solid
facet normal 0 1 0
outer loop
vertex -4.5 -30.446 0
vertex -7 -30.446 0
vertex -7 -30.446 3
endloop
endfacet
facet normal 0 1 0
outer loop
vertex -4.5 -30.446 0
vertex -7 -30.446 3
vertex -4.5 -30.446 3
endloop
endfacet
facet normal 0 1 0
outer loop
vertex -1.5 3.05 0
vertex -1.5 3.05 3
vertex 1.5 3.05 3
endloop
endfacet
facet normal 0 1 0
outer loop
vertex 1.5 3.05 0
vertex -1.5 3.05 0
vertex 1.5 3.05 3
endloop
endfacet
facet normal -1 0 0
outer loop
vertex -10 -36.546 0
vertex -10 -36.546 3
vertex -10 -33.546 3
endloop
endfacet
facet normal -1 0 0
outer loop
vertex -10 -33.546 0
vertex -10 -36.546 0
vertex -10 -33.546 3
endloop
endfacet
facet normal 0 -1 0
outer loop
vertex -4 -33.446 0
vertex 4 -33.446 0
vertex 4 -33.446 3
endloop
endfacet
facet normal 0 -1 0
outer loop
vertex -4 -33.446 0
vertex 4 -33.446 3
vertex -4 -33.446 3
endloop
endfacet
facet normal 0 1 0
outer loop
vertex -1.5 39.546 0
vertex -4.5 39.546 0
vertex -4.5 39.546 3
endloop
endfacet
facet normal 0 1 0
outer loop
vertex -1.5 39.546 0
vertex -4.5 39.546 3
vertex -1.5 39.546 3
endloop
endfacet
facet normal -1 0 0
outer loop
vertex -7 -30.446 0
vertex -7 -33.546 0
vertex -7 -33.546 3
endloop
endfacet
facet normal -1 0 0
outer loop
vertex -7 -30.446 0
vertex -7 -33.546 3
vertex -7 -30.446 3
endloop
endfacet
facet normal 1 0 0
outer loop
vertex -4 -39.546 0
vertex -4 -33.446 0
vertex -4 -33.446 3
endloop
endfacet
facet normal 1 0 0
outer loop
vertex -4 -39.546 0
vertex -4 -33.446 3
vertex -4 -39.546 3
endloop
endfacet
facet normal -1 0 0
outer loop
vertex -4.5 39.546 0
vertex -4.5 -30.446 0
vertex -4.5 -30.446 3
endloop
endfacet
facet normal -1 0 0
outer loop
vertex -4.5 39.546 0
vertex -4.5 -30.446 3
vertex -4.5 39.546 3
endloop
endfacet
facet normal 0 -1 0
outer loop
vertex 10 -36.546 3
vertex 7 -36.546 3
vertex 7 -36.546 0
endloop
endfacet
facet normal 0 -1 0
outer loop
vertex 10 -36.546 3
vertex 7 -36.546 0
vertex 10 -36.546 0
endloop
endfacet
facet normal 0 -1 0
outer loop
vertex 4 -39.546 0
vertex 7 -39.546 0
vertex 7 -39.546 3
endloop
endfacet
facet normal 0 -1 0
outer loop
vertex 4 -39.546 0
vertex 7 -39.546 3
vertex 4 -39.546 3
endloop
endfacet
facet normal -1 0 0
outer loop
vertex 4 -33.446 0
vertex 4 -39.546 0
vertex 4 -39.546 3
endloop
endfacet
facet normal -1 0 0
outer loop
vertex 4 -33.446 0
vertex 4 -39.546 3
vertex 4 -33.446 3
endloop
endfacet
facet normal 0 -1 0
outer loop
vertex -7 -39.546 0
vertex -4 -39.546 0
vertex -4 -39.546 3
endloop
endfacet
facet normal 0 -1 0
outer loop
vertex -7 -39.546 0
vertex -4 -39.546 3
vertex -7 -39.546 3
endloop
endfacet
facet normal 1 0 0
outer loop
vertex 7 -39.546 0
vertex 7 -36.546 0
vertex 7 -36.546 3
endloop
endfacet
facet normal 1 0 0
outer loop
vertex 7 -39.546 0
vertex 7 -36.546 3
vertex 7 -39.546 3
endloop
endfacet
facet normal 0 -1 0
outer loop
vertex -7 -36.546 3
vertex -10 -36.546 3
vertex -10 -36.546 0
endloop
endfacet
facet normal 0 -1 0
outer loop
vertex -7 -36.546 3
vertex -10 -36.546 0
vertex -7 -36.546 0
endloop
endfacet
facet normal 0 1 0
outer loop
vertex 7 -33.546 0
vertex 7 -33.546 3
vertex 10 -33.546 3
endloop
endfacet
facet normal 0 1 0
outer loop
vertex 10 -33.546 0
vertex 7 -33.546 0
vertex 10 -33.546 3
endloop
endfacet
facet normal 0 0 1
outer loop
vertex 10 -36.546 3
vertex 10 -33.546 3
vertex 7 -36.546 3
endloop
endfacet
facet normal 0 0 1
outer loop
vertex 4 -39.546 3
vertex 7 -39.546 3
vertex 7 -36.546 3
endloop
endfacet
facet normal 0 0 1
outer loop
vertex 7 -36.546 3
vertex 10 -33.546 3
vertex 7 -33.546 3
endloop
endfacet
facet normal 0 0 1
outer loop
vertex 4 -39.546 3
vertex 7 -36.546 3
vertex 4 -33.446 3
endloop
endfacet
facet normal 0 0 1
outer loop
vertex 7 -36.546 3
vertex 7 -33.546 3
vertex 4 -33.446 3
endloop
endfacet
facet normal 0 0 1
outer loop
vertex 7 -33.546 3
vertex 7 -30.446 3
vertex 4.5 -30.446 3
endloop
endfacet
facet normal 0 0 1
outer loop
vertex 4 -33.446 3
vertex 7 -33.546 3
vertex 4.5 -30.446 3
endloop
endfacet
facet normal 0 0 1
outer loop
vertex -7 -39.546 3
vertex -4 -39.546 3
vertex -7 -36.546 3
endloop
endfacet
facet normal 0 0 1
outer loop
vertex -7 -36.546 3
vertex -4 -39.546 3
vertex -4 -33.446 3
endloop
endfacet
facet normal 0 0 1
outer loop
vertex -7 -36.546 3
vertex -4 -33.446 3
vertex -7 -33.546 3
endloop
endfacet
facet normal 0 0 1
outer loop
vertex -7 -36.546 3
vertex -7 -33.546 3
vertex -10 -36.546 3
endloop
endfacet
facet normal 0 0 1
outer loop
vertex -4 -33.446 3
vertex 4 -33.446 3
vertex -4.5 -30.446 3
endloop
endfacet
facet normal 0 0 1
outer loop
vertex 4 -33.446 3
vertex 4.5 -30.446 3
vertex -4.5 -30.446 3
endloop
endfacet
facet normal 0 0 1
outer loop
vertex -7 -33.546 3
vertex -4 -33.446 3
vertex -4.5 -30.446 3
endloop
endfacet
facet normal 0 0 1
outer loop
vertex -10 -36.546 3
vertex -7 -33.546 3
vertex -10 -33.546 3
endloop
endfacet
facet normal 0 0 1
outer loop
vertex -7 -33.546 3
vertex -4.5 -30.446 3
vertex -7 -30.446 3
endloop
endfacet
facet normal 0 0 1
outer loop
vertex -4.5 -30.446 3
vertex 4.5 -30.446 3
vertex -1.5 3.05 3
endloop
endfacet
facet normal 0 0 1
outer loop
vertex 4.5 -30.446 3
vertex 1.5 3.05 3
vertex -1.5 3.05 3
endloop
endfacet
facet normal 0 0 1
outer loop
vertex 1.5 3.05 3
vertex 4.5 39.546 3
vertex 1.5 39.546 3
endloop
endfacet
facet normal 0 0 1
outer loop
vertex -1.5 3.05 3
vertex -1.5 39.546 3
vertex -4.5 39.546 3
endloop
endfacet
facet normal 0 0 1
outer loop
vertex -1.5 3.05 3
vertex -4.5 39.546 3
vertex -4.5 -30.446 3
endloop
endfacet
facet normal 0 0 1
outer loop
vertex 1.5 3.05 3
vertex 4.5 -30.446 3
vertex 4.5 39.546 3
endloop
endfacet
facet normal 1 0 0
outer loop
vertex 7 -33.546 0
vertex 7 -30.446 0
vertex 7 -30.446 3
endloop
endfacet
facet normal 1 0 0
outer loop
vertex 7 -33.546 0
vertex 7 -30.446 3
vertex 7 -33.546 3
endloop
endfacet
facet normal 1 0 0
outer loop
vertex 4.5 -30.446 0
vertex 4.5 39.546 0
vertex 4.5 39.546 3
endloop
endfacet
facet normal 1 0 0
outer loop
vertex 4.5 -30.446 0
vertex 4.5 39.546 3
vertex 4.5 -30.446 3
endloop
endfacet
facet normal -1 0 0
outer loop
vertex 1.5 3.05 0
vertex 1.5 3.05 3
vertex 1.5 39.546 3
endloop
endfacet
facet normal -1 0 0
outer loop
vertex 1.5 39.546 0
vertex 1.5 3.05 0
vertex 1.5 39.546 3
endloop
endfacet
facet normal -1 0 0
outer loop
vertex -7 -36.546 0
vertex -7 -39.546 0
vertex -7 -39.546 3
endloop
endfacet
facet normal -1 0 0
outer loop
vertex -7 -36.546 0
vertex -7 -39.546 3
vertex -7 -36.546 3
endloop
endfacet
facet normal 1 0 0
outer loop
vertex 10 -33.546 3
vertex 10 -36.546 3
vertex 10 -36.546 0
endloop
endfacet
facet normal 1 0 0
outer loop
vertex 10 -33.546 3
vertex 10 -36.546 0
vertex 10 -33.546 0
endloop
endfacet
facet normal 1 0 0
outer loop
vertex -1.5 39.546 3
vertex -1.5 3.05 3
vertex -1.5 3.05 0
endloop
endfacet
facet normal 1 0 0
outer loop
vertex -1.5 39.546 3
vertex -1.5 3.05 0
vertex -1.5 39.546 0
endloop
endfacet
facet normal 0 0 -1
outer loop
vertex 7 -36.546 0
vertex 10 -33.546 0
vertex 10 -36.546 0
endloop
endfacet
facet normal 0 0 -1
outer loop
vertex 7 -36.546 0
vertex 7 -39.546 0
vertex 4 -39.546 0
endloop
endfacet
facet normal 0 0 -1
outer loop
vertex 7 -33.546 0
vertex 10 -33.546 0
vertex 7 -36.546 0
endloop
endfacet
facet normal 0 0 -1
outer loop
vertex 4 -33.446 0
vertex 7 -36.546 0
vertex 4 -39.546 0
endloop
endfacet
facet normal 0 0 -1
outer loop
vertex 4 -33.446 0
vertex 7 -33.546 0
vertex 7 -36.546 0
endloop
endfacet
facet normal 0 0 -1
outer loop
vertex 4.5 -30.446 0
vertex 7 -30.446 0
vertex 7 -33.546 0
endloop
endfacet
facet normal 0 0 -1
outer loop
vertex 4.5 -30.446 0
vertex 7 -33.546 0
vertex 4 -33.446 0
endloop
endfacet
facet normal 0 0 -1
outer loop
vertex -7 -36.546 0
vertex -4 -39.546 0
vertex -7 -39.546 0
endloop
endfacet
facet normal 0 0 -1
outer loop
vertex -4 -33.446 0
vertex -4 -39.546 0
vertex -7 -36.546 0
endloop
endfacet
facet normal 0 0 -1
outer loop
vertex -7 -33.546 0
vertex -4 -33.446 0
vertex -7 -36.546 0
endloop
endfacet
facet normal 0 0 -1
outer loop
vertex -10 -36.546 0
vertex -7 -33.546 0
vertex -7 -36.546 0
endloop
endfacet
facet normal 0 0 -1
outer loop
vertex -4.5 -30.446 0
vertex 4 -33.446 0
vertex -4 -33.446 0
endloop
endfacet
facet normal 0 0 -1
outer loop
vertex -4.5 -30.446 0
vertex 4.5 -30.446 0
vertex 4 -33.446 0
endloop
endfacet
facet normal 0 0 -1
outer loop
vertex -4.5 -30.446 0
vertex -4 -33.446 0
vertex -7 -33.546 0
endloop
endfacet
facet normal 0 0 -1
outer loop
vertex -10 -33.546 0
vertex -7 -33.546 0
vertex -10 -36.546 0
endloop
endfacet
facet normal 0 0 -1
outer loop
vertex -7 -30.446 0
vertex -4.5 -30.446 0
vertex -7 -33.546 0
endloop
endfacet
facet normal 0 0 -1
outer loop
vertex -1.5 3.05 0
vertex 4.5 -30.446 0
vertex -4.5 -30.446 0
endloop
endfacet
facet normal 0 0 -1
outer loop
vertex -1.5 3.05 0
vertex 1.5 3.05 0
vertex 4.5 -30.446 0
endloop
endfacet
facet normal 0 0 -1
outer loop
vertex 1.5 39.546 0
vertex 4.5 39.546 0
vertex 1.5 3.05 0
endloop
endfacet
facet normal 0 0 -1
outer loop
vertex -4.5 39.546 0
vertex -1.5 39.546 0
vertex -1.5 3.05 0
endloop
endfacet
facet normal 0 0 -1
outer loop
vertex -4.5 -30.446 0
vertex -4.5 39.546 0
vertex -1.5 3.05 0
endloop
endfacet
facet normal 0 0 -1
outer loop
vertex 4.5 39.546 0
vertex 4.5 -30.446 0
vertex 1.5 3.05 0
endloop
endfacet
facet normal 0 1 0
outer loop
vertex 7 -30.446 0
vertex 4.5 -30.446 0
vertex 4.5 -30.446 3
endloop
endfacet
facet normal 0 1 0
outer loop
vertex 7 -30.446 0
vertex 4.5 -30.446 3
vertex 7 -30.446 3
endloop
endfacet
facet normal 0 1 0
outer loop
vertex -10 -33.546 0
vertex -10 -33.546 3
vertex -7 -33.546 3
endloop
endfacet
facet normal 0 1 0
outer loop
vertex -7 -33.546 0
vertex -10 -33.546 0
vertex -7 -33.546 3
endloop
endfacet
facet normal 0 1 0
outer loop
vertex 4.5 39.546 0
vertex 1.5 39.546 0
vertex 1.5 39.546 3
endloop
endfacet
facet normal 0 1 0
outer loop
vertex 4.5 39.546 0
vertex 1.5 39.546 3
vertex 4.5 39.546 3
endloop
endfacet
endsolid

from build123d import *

# Parameters (mm, degrees)
EXTRUDE_1_DEPTH     = 3
SKETCH_2_W          = 3
SKETCH_2_H          = 36.495999937
CUT_EXTRUDE_1_DEPTH = 3
SKETCH_3_W          = 3
SKETCH_3_H          = 3
EXTRUDE_2_DEPTH     = 3


with BuildPart() as part:
    # 스케치1 → 보스-돌출1 (new body)
    with BuildSketch(Plane.XY):
        Polygon((-4.5, 39.545999937), (4.5, 39.545999937), (4.5, -30.445999937), (7, -30.445999937), (7, -39.545999937), (4, -39.545999937), (4, -33.445999937), (-4, -33.445999937), (-4, -39.545999937), (-7, -39.545999937), (-7, -30.445999937), (-4.5, -30.445999937), align=None)
    extrude(amount=EXTRUDE_1_DEPTH)

    # 스케치2 → 컷-돌출1 (cut)
    with BuildSketch(Plane.XY.offset(3)):
        with Locations((0, 21.297999969)):
            Rectangle(SKETCH_2_W, SKETCH_2_H)
    extrude(amount=-CUT_EXTRUDE_1_DEPTH, mode=Mode.SUBTRACT)

    # 스케치3 → 보스-돌출2 (add)
    with BuildSketch(Plane.XY.offset(3)):
        with Locations((-8.5, -35.045999937)):
            Rectangle(SKETCH_3_W, SKETCH_3_H)
        with Locations((8.5, -35.045999937)):
            Rectangle(SKETCH_3_W, SKETCH_3_H)
    extrude(amount=-EXTRUDE_2_DEPTH)


solid = part.part
